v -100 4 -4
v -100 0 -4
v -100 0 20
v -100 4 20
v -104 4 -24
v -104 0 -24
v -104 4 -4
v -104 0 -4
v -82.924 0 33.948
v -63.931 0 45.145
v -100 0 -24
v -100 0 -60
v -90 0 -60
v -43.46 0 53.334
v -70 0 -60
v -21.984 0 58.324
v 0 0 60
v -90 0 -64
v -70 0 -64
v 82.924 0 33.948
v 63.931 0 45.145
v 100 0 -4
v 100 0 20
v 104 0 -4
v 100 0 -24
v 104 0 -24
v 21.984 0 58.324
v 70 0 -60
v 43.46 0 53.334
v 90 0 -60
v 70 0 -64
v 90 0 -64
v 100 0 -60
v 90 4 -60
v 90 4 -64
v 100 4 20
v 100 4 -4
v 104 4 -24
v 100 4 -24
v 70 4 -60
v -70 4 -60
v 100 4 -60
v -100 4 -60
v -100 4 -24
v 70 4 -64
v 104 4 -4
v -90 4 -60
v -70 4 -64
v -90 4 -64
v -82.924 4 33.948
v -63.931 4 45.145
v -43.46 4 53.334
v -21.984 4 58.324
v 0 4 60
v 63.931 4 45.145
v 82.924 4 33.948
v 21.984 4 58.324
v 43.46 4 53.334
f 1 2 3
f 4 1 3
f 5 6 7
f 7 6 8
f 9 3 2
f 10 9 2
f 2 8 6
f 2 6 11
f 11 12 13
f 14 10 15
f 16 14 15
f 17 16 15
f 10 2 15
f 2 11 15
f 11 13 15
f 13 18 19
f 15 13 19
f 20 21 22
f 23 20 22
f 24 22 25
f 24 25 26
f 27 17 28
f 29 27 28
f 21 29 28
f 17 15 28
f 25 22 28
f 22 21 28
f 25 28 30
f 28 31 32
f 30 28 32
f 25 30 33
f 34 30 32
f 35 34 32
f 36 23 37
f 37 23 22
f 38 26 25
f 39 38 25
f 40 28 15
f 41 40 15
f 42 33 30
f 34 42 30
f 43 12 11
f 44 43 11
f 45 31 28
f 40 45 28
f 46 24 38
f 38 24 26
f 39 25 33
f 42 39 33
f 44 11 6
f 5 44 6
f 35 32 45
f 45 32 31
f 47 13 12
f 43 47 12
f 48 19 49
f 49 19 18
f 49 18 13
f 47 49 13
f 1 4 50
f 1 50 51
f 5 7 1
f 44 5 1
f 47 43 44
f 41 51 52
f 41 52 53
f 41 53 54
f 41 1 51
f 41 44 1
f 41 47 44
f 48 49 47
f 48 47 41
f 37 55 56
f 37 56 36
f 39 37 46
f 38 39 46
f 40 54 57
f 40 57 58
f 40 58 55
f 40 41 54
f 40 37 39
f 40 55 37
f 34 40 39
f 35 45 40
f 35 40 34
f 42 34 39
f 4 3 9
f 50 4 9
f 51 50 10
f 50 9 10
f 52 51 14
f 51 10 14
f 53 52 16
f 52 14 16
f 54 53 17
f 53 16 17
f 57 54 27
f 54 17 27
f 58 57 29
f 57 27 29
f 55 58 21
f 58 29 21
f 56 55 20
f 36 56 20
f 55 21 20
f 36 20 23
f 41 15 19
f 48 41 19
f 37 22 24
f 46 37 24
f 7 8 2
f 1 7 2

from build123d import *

# Parameters (mm, degrees)
EXTRUDE1_DEPTH = 4


with BuildPart() as part:
    # Sketch1 → Extrude1 (new body)
    with BuildSketch(Plane(origin=(0, 0, 0), x_dir=(1, 0, 0), z_dir=(0, 1, 0))):
        with BuildLine():
            Line((-90, 60), (-100, 60))
            Line((-100, 60), (-100, 24))
            Line((-100, 24), (-104, 24))
            Line((-104, 24), (-104, 4))
            Line((-104, 4), (-100, 4))
            Line((-100, 4), (-100, -20))
            ThreePointArc((-100, -20), (0, -60), (100, -20))
            Line((100, -20), (100, 4))
            Line((100, 4), (104, 4))
            Line((104, 4), (104, 24))
            Line((104, 24), (100, 24))
            Line((100, 24), (100, 60))
            Line((100, 60), (90, 60))
            Line((90, 60), (90, 64))
            Line((90, 64), (70, 64))
            Line((70, 64), (70, 60))
            Line((70, 60), (-70, 60))
            Line((-70, 60), (-70, 64))
            Line((-70, 64), (-90, 64))
            Line((-90, 64), (-90, 60))
        make_face()
    extrude(amount=EXTRUDE1_DEPTH)


solid = part.part
